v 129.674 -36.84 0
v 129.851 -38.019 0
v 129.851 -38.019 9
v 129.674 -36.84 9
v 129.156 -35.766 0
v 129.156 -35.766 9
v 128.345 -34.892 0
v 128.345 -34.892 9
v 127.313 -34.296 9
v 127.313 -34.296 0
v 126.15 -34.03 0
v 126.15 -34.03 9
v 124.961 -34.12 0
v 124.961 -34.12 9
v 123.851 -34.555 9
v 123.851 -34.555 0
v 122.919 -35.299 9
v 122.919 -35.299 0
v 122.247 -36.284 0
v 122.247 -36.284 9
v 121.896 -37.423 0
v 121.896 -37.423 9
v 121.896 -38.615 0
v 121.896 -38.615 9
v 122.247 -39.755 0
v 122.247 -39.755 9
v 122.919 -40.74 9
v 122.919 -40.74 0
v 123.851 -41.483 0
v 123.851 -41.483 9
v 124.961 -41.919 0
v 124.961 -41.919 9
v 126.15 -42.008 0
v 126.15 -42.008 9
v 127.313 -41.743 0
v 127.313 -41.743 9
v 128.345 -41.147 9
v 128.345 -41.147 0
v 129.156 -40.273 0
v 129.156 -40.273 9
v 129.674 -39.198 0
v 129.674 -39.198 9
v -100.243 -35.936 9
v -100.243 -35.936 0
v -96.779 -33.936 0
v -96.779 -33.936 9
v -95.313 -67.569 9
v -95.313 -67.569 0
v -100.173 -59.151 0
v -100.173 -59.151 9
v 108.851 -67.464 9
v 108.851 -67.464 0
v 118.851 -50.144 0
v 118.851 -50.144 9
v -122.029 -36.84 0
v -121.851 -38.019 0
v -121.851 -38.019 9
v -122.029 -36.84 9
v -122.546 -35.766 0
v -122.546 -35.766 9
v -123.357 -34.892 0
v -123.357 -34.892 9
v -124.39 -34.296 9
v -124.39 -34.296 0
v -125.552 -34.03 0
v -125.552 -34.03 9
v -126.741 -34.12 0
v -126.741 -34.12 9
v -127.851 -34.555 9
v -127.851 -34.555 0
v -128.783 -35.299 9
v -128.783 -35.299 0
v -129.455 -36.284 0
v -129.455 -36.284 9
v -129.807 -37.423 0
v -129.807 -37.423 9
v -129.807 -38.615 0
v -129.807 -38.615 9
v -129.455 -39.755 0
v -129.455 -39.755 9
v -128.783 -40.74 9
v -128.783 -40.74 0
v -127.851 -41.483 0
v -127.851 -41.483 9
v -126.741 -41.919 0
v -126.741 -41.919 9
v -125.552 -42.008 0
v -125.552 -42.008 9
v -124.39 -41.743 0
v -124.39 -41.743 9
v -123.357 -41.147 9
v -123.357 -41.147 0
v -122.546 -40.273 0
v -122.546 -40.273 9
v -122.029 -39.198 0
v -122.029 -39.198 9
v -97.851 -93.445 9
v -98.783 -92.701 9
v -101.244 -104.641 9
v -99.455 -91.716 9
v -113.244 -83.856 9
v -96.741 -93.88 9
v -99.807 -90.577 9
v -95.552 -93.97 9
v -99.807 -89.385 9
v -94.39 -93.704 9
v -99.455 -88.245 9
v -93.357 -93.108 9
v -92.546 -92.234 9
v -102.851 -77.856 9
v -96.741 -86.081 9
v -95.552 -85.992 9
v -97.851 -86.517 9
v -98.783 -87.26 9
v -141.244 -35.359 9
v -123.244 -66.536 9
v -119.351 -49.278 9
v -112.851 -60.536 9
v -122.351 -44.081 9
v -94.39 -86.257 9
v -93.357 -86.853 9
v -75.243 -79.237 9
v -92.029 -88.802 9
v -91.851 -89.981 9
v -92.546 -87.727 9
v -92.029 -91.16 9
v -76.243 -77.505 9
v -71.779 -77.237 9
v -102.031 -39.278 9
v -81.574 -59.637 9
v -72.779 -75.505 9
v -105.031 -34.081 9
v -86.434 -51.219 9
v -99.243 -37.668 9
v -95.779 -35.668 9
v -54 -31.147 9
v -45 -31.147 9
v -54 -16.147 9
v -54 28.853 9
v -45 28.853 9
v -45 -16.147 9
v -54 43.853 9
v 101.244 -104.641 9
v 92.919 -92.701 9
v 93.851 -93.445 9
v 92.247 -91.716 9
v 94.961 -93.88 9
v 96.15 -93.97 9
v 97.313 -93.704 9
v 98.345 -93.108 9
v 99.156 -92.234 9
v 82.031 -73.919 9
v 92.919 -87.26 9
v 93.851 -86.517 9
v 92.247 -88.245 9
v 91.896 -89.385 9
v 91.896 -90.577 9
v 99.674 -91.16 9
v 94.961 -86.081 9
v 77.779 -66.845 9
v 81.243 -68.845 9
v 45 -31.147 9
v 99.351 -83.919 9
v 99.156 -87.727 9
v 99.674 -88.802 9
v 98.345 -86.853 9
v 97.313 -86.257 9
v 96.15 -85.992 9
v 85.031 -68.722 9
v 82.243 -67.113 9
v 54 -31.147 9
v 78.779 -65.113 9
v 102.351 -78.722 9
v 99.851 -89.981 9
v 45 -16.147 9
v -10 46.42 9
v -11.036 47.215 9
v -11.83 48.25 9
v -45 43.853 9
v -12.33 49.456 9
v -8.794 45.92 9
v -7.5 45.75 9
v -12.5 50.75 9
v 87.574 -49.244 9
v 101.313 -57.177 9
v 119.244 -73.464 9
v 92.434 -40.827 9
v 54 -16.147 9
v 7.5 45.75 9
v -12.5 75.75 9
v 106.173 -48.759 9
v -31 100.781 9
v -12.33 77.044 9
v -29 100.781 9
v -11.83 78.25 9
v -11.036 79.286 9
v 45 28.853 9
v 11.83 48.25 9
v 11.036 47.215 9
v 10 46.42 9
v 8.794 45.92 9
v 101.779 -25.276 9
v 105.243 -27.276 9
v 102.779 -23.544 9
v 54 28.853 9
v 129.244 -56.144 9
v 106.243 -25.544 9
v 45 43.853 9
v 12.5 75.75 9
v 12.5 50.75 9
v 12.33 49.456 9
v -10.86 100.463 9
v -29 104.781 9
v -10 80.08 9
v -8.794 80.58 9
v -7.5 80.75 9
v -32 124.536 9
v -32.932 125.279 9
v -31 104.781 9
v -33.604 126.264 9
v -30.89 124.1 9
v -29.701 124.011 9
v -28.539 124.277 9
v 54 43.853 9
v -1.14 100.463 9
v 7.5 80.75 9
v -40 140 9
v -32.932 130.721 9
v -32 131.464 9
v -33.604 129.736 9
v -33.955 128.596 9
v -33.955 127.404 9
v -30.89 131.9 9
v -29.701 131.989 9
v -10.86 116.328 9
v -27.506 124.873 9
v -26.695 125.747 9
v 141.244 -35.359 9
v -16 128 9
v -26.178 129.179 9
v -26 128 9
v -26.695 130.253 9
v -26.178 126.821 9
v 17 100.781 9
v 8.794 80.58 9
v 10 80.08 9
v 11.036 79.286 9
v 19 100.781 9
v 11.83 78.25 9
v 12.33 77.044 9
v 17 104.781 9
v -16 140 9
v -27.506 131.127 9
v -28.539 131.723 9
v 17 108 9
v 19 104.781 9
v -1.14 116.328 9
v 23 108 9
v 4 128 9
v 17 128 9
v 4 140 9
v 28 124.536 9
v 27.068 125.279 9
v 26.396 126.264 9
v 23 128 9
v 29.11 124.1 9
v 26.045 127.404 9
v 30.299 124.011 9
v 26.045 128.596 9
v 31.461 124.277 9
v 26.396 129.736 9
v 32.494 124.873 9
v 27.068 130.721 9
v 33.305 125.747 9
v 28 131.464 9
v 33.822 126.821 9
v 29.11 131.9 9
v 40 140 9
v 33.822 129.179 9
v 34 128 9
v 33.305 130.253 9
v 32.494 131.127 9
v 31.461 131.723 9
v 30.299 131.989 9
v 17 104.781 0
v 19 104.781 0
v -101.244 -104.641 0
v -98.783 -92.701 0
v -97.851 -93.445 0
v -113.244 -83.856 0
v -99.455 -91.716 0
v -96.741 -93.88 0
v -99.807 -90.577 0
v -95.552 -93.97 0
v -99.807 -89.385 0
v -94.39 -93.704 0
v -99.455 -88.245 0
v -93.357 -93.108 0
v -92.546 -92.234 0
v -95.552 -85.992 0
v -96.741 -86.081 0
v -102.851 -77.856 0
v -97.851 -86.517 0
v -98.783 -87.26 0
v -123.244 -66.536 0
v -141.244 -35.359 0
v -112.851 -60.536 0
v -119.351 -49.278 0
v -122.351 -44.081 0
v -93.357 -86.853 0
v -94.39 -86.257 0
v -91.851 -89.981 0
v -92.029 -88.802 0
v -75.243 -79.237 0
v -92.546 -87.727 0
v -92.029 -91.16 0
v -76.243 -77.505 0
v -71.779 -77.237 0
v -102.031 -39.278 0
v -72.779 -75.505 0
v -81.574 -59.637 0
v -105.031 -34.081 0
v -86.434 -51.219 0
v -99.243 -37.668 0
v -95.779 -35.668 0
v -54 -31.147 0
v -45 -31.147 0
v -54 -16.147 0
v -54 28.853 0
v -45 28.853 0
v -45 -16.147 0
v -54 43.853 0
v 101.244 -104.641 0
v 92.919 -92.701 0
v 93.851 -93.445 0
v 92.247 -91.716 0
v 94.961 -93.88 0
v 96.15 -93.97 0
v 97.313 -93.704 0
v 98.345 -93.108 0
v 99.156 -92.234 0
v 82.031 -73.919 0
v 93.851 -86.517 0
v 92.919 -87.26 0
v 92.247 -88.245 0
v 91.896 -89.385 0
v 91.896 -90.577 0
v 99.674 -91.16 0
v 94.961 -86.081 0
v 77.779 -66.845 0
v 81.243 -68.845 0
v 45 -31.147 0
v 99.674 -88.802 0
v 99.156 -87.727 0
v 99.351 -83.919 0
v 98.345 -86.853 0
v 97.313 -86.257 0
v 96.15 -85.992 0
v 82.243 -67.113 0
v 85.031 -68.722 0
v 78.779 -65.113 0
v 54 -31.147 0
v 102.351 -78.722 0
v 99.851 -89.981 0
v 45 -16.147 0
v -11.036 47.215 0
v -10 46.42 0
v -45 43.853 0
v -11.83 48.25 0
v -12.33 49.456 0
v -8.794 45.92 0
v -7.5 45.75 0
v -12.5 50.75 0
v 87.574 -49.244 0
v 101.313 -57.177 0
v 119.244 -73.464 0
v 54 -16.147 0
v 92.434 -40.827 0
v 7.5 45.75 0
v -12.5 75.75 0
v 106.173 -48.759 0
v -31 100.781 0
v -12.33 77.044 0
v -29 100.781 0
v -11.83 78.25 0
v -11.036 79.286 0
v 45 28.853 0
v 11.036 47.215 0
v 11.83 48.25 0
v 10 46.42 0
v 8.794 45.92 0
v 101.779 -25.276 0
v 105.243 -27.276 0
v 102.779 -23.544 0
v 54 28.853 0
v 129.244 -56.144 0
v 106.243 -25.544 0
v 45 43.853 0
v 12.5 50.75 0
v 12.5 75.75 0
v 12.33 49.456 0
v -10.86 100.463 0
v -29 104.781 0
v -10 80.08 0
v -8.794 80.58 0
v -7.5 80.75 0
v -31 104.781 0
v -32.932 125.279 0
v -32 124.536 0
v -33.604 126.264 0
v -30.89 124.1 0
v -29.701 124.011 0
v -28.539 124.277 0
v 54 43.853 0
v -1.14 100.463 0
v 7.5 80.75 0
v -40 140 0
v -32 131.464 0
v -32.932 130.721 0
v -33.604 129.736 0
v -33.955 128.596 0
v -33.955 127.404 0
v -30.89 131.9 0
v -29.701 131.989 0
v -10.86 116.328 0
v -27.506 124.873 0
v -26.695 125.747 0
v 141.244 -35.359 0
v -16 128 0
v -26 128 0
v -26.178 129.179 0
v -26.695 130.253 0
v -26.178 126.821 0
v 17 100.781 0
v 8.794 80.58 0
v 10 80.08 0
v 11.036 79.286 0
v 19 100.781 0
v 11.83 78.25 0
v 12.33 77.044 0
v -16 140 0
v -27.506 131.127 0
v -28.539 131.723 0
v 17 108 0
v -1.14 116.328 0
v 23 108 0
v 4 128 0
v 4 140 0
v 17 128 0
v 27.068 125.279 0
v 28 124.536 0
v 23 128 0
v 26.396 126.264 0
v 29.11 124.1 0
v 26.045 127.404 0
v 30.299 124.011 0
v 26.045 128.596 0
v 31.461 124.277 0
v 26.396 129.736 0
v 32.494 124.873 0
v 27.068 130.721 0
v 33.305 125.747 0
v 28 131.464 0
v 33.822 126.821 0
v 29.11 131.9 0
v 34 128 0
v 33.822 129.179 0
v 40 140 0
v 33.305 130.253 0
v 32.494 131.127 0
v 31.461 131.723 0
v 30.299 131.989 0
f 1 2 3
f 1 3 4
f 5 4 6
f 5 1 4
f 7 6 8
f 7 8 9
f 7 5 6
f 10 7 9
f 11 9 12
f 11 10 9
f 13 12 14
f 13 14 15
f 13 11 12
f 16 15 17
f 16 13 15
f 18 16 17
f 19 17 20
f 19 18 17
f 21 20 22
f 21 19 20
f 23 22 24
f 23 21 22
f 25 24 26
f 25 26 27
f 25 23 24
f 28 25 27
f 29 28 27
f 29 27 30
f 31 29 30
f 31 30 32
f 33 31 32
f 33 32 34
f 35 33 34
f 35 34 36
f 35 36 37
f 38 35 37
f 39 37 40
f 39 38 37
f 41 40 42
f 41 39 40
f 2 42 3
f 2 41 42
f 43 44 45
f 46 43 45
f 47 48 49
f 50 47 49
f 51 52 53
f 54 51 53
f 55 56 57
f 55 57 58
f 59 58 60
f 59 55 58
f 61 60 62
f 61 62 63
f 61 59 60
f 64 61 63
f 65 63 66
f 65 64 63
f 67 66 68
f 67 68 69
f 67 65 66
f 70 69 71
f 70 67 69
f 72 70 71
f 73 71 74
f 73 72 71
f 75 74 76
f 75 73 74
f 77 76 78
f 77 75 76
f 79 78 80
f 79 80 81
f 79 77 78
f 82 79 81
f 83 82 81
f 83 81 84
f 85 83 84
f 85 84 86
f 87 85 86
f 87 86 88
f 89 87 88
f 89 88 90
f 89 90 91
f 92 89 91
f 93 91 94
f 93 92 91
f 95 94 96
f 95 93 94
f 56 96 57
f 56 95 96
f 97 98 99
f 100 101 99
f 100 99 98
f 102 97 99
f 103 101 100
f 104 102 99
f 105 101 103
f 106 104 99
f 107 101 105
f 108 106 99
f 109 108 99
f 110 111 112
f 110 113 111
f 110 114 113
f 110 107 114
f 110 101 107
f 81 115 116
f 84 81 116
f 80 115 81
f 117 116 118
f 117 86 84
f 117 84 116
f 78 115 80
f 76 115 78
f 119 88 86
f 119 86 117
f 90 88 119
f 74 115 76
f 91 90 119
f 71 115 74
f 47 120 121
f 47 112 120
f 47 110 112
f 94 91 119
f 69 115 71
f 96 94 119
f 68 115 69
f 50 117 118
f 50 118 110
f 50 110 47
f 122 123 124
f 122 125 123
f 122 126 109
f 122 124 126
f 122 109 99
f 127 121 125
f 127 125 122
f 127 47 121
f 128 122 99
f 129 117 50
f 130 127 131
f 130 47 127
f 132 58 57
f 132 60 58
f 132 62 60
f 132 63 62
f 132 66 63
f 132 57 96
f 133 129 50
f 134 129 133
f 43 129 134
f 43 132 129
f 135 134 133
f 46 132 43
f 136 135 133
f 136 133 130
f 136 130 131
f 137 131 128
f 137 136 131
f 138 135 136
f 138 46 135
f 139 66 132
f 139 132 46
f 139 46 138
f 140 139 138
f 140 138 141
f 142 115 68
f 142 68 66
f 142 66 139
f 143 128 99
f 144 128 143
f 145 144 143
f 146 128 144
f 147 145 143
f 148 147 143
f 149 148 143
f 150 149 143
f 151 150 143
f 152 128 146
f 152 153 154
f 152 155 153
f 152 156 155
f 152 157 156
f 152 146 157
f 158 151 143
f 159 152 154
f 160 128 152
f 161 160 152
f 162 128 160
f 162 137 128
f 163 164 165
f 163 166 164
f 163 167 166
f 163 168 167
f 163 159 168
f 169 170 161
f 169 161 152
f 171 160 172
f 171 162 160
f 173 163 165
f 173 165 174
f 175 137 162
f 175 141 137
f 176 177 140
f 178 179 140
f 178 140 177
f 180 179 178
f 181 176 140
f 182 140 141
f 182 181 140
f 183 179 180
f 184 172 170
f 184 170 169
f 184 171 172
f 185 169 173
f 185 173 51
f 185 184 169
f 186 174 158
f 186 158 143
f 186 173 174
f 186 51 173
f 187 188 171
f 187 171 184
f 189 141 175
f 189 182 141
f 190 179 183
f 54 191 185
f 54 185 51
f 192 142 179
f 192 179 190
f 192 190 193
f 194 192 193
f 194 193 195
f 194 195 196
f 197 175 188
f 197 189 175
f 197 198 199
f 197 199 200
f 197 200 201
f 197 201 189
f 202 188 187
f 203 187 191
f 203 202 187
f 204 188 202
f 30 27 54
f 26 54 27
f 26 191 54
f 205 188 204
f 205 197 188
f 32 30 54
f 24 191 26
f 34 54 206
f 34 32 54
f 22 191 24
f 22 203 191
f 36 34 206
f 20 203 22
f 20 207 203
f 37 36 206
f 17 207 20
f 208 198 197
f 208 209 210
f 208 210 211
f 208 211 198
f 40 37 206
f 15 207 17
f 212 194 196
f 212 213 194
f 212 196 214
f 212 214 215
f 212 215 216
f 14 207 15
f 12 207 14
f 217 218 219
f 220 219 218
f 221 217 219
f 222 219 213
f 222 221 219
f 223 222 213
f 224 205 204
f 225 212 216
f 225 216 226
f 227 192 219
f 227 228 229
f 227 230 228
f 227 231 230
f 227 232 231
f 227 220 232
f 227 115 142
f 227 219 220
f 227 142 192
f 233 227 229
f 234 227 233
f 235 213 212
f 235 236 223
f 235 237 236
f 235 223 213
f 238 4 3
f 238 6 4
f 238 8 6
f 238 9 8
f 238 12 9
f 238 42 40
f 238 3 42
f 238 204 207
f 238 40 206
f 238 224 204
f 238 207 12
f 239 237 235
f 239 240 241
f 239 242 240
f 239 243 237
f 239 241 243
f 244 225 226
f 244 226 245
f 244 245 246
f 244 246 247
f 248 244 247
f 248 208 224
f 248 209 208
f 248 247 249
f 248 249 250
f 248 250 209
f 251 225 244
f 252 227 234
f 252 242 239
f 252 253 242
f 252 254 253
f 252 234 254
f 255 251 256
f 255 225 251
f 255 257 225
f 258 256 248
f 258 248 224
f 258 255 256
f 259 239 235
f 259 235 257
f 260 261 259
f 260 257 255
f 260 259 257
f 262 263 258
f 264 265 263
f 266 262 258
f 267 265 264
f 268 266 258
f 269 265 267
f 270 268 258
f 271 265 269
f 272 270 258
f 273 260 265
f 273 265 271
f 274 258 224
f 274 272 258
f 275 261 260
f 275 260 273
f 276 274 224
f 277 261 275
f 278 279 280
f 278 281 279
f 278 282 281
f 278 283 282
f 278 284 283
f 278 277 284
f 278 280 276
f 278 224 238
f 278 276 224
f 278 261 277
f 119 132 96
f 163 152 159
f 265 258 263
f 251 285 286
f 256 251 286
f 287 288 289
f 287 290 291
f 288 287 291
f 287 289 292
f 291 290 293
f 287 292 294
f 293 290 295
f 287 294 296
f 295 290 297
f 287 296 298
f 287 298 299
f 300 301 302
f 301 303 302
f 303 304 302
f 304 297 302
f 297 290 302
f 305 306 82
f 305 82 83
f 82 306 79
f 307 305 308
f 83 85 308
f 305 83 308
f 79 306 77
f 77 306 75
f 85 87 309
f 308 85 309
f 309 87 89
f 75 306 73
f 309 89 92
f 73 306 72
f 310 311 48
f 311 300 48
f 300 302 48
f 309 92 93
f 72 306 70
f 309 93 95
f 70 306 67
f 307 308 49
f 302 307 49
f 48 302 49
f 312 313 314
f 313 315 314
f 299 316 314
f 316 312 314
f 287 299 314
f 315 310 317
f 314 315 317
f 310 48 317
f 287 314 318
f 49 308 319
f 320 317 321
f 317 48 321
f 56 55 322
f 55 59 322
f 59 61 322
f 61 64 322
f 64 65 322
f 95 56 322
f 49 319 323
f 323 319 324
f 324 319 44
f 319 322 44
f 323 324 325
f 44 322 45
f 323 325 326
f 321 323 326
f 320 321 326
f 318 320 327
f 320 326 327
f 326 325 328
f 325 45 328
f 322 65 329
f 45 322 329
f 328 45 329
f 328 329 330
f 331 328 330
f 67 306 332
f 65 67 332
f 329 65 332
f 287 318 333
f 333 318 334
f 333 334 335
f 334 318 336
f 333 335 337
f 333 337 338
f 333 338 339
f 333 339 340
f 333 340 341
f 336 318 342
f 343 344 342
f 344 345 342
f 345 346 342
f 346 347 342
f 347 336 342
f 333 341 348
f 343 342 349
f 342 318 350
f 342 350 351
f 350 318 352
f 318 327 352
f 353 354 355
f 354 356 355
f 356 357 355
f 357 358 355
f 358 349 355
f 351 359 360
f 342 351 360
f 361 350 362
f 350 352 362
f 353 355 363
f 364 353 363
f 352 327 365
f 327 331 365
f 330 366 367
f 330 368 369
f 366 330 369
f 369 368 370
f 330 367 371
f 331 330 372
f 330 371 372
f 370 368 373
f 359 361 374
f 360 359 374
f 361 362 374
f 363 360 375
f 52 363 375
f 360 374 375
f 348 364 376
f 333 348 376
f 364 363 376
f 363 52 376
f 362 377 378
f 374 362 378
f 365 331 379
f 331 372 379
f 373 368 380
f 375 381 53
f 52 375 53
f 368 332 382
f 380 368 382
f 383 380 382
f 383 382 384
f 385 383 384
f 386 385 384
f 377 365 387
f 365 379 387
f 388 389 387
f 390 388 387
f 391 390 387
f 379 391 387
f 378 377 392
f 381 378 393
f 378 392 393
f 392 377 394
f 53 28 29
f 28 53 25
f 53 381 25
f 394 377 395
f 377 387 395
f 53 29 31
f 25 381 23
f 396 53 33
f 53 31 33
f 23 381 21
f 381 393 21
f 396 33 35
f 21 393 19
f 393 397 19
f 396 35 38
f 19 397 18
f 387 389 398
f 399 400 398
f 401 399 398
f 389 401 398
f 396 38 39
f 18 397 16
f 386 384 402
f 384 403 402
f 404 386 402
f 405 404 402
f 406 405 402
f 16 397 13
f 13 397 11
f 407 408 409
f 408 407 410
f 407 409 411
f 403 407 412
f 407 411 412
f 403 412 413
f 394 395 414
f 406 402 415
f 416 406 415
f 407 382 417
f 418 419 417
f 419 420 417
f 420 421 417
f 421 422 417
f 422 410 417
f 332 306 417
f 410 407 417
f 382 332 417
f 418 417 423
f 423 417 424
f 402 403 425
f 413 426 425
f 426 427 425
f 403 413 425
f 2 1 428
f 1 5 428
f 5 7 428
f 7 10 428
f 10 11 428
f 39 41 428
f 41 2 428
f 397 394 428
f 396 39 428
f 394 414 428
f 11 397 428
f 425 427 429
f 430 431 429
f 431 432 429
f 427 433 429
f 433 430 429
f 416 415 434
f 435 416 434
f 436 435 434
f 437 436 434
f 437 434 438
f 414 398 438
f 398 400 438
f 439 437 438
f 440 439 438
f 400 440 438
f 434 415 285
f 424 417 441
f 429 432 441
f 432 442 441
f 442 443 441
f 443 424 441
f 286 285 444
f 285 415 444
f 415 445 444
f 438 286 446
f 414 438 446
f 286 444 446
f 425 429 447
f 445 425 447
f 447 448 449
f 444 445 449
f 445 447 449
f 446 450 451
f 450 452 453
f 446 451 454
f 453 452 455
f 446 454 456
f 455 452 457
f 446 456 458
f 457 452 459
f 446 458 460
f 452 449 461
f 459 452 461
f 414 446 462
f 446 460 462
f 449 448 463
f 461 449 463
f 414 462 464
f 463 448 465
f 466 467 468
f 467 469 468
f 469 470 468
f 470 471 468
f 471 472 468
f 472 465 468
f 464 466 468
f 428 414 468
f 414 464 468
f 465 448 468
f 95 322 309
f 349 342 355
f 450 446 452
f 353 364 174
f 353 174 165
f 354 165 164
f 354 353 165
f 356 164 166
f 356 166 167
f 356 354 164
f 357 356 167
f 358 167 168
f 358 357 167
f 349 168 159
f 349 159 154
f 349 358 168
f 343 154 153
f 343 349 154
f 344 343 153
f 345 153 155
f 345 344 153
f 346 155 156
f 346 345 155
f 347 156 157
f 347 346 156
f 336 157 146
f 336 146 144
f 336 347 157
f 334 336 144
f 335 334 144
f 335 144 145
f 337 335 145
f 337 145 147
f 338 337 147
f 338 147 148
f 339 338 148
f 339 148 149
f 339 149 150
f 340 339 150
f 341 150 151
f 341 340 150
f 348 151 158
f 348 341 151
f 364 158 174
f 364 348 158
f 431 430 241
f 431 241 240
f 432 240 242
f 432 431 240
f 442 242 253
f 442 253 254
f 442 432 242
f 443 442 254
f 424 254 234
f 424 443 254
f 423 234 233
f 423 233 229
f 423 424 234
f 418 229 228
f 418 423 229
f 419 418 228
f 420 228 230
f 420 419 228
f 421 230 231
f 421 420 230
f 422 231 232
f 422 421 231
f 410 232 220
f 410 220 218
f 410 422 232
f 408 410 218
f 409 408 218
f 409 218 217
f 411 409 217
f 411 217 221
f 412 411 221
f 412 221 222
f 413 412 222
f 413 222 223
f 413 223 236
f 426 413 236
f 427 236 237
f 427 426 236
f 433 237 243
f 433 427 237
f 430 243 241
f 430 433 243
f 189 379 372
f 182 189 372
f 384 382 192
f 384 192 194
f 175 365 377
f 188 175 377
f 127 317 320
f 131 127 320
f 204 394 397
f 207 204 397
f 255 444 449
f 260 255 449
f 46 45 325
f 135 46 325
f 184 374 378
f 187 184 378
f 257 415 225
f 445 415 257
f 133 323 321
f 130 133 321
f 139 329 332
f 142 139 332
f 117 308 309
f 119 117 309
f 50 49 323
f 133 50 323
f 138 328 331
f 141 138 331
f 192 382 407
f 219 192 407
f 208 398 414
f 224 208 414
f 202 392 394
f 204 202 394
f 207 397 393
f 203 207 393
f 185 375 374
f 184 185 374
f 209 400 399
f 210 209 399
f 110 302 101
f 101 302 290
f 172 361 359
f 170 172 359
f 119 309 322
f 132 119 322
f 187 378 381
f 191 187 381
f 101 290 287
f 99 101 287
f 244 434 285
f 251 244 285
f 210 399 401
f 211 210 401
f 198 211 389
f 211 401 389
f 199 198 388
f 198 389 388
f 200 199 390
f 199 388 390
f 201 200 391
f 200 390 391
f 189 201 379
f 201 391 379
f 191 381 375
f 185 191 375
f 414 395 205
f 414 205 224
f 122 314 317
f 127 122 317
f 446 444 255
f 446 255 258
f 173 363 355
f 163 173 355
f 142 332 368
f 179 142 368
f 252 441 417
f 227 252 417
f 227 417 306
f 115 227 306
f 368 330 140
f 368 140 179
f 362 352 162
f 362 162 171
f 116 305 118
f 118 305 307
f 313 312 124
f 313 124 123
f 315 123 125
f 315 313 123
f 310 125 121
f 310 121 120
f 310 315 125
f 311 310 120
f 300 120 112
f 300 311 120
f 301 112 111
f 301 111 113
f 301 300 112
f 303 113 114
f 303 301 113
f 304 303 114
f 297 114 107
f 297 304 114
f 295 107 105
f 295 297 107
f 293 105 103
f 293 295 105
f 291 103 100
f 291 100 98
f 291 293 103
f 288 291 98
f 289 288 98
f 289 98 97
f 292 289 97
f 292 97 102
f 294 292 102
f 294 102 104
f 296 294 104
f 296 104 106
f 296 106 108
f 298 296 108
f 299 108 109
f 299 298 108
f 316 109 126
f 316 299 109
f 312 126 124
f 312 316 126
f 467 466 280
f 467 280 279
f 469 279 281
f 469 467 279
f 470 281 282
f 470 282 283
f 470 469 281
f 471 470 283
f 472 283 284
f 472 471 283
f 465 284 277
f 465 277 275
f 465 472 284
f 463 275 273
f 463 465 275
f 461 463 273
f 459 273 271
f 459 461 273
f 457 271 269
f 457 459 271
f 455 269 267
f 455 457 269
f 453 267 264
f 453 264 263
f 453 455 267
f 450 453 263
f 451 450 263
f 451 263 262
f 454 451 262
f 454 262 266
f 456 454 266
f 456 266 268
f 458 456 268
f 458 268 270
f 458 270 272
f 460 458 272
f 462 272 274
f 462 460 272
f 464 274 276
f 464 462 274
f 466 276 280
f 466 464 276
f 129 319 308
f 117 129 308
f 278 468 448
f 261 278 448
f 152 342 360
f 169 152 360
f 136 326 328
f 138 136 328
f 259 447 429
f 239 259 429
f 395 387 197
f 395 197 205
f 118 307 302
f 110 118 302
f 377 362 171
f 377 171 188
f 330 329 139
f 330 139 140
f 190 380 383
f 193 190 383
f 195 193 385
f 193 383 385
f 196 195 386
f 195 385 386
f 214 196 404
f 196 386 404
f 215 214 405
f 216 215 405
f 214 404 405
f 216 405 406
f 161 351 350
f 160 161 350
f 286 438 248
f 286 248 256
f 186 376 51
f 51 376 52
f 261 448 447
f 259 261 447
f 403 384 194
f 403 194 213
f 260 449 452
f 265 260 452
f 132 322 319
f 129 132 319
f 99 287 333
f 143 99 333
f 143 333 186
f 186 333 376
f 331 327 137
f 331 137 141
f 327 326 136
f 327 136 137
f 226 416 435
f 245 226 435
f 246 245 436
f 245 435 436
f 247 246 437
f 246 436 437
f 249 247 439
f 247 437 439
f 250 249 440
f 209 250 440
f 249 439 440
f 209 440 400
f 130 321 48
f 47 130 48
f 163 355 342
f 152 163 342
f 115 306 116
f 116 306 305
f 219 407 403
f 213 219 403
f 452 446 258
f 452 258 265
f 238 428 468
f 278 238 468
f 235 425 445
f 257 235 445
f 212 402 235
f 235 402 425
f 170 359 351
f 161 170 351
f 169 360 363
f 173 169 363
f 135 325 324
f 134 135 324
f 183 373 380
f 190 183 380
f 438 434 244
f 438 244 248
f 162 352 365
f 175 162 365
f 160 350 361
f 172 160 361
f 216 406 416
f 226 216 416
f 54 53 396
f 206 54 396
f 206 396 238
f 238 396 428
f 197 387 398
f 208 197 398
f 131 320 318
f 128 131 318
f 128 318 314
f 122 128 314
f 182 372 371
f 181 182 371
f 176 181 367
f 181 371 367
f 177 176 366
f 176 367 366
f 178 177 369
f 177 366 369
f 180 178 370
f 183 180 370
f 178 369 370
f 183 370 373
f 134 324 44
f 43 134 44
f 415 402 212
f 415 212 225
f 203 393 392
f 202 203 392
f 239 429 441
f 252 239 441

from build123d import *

# Parameters (mm, degrees)
F0_R     = 4
F0_W     = 9
F0_H     = 15
F0_W_2   = 2
F0_H_2   = 4
F0_W_3   = 9.720032
F0_H_3   = 15.864611
F0_W_4   = 6
F0_H_4   = 20
F1_DEPTH = 9


with BuildPart() as f1:
    # F0 (on Top) → F1 (new body)
    with BuildSketch(Plane.XY):
        Polygon((-16, 140), (-40, 140), (-141.243557, -35.358984), (-123.243557, -66.535898), (-112.851252, -60.535898), (-102.851252, -77.856406), (-113.243557, -83.856406), (-101.243557, -104.641016), (101.243557, -104.641016), (119.243557, -73.464102), (108.851252, -67.464102), (118.851252, -50.143594), (129.243557, -56.143594), (141.243557, -35.358984), (40, 140), (4, 140), (4, 128), (-16, 128), align=None)
        with Locations((-95.851252, -89.980762)):
            Circle(F0_R, mode=Mode.SUBTRACT)
        Polygon((-76.242984, -77.505223), (-72.778882, -75.505223), (-71.778882, -77.237274), (-75.242984, -79.237274), align=None, mode=Mode.SUBTRACT)
        Polygon((-100.173051, -59.151278), (-86.433895, -51.218972), (-81.573879, -59.636768), (-95.313035, -67.569073), align=None, mode=Mode.SUBTRACT)
        with Locations((-125.851252, -38.019238)):
            Circle(F0_R, mode=Mode.SUBTRACT)
        Polygon((-119.351252, -49.277568), (-122.351252, -44.081416), (-105.030744, -34.081416), (-102.030744, -39.277568), align=None, mode=Mode.SUBTRACT)
        Polygon((-99.242984, -37.668054), (-100.242984, -35.936003), (-96.778882, -33.936003), (-95.778882, -35.668054), align=None, mode=Mode.SUBTRACT)
        with Locations((-49.5, -23.646934)):
            Rectangle(F0_W, F0_H, mode=Mode.SUBTRACT)
        with Locations((95.851252, -89.980762)):
            Circle(F0_R, mode=Mode.SUBTRACT)
        Polygon((102.351252, -78.722432), (99.351252, -83.918584), (82.030744, -73.918584), (85.030744, -68.722432), align=None, mode=Mode.SUBTRACT)
        Polygon((82.242984, -67.112918), (81.242984, -68.844969), (77.778882, -66.844969), (78.778882, -65.112918), align=None, mode=Mode.SUBTRACT)
        Polygon((101.313035, -57.176768), (87.573879, -49.244463), (92.433895, -40.826667), (106.173051, -48.758973), align=None, mode=Mode.SUBTRACT)
        with Locations((49.5, -23.646934)):
            Rectangle(F0_W, F0_H, mode=Mode.SUBTRACT)
        Polygon((105.242984, -27.275749), (101.778882, -25.275749), (102.778882, -23.543698), (106.242984, -25.543698), align=None, mode=Mode.SUBTRACT)
        with Locations((125.851252, -38.019238)):
            Circle(F0_R, mode=Mode.SUBTRACT)
        with Locations((-49.5, 36.353066)):
            Rectangle(F0_W, F0_H, mode=Mode.SUBTRACT)
        with Locations((-30, 102.780972)):
            Rectangle(F0_W_2, F0_H_2, mode=Mode.SUBTRACT)
        with Locations((-6, 108.39574)):
            Rectangle(F0_W_3, F0_H_3, mode=Mode.SUBTRACT)
        with Locations((-30, 128)):
            Circle(F0_R, mode=Mode.SUBTRACT)
        with Locations((49.5, 36.353066)):
            Rectangle(F0_W, F0_H, mode=Mode.SUBTRACT)
        with BuildLine():
            Line((-7.5, 80.75011), (7.5, 80.75011))
            ThreePointArc((7.5, 80.75011), (11.035534, 79.285643), (12.5, 75.75011))
            Line((12.5, 75.75011), (12.5, 50.75011))
            ThreePointArc((12.5, 50.75011), (11.035534, 47.214576), (7.5, 45.75011))
            Line((7.5, 45.75011), (-7.5, 45.75011))
            ThreePointArc((-7.5, 45.75011), (-11.035534, 47.214576), (-12.5, 50.75011))
            Line((-12.5, 50.75011), (-12.5, 75.75011))
            ThreePointArc((-12.5, 75.75011), (-11.035534, 79.285643), (-7.5, 80.75011))
        make_face(mode=Mode.SUBTRACT)
        with Locations((18, 102.780972)):
            Rectangle(F0_W_2, F0_H_2, mode=Mode.SUBTRACT)
        with Locations((20, 118)):
            Rectangle(F0_W_4, F0_H_4, mode=Mode.SUBTRACT)
        with Locations((30, 128)):
            Circle(F0_R, mode=Mode.SUBTRACT)
    extrude(amount=F1_DEPTH)


solid = f1.part
